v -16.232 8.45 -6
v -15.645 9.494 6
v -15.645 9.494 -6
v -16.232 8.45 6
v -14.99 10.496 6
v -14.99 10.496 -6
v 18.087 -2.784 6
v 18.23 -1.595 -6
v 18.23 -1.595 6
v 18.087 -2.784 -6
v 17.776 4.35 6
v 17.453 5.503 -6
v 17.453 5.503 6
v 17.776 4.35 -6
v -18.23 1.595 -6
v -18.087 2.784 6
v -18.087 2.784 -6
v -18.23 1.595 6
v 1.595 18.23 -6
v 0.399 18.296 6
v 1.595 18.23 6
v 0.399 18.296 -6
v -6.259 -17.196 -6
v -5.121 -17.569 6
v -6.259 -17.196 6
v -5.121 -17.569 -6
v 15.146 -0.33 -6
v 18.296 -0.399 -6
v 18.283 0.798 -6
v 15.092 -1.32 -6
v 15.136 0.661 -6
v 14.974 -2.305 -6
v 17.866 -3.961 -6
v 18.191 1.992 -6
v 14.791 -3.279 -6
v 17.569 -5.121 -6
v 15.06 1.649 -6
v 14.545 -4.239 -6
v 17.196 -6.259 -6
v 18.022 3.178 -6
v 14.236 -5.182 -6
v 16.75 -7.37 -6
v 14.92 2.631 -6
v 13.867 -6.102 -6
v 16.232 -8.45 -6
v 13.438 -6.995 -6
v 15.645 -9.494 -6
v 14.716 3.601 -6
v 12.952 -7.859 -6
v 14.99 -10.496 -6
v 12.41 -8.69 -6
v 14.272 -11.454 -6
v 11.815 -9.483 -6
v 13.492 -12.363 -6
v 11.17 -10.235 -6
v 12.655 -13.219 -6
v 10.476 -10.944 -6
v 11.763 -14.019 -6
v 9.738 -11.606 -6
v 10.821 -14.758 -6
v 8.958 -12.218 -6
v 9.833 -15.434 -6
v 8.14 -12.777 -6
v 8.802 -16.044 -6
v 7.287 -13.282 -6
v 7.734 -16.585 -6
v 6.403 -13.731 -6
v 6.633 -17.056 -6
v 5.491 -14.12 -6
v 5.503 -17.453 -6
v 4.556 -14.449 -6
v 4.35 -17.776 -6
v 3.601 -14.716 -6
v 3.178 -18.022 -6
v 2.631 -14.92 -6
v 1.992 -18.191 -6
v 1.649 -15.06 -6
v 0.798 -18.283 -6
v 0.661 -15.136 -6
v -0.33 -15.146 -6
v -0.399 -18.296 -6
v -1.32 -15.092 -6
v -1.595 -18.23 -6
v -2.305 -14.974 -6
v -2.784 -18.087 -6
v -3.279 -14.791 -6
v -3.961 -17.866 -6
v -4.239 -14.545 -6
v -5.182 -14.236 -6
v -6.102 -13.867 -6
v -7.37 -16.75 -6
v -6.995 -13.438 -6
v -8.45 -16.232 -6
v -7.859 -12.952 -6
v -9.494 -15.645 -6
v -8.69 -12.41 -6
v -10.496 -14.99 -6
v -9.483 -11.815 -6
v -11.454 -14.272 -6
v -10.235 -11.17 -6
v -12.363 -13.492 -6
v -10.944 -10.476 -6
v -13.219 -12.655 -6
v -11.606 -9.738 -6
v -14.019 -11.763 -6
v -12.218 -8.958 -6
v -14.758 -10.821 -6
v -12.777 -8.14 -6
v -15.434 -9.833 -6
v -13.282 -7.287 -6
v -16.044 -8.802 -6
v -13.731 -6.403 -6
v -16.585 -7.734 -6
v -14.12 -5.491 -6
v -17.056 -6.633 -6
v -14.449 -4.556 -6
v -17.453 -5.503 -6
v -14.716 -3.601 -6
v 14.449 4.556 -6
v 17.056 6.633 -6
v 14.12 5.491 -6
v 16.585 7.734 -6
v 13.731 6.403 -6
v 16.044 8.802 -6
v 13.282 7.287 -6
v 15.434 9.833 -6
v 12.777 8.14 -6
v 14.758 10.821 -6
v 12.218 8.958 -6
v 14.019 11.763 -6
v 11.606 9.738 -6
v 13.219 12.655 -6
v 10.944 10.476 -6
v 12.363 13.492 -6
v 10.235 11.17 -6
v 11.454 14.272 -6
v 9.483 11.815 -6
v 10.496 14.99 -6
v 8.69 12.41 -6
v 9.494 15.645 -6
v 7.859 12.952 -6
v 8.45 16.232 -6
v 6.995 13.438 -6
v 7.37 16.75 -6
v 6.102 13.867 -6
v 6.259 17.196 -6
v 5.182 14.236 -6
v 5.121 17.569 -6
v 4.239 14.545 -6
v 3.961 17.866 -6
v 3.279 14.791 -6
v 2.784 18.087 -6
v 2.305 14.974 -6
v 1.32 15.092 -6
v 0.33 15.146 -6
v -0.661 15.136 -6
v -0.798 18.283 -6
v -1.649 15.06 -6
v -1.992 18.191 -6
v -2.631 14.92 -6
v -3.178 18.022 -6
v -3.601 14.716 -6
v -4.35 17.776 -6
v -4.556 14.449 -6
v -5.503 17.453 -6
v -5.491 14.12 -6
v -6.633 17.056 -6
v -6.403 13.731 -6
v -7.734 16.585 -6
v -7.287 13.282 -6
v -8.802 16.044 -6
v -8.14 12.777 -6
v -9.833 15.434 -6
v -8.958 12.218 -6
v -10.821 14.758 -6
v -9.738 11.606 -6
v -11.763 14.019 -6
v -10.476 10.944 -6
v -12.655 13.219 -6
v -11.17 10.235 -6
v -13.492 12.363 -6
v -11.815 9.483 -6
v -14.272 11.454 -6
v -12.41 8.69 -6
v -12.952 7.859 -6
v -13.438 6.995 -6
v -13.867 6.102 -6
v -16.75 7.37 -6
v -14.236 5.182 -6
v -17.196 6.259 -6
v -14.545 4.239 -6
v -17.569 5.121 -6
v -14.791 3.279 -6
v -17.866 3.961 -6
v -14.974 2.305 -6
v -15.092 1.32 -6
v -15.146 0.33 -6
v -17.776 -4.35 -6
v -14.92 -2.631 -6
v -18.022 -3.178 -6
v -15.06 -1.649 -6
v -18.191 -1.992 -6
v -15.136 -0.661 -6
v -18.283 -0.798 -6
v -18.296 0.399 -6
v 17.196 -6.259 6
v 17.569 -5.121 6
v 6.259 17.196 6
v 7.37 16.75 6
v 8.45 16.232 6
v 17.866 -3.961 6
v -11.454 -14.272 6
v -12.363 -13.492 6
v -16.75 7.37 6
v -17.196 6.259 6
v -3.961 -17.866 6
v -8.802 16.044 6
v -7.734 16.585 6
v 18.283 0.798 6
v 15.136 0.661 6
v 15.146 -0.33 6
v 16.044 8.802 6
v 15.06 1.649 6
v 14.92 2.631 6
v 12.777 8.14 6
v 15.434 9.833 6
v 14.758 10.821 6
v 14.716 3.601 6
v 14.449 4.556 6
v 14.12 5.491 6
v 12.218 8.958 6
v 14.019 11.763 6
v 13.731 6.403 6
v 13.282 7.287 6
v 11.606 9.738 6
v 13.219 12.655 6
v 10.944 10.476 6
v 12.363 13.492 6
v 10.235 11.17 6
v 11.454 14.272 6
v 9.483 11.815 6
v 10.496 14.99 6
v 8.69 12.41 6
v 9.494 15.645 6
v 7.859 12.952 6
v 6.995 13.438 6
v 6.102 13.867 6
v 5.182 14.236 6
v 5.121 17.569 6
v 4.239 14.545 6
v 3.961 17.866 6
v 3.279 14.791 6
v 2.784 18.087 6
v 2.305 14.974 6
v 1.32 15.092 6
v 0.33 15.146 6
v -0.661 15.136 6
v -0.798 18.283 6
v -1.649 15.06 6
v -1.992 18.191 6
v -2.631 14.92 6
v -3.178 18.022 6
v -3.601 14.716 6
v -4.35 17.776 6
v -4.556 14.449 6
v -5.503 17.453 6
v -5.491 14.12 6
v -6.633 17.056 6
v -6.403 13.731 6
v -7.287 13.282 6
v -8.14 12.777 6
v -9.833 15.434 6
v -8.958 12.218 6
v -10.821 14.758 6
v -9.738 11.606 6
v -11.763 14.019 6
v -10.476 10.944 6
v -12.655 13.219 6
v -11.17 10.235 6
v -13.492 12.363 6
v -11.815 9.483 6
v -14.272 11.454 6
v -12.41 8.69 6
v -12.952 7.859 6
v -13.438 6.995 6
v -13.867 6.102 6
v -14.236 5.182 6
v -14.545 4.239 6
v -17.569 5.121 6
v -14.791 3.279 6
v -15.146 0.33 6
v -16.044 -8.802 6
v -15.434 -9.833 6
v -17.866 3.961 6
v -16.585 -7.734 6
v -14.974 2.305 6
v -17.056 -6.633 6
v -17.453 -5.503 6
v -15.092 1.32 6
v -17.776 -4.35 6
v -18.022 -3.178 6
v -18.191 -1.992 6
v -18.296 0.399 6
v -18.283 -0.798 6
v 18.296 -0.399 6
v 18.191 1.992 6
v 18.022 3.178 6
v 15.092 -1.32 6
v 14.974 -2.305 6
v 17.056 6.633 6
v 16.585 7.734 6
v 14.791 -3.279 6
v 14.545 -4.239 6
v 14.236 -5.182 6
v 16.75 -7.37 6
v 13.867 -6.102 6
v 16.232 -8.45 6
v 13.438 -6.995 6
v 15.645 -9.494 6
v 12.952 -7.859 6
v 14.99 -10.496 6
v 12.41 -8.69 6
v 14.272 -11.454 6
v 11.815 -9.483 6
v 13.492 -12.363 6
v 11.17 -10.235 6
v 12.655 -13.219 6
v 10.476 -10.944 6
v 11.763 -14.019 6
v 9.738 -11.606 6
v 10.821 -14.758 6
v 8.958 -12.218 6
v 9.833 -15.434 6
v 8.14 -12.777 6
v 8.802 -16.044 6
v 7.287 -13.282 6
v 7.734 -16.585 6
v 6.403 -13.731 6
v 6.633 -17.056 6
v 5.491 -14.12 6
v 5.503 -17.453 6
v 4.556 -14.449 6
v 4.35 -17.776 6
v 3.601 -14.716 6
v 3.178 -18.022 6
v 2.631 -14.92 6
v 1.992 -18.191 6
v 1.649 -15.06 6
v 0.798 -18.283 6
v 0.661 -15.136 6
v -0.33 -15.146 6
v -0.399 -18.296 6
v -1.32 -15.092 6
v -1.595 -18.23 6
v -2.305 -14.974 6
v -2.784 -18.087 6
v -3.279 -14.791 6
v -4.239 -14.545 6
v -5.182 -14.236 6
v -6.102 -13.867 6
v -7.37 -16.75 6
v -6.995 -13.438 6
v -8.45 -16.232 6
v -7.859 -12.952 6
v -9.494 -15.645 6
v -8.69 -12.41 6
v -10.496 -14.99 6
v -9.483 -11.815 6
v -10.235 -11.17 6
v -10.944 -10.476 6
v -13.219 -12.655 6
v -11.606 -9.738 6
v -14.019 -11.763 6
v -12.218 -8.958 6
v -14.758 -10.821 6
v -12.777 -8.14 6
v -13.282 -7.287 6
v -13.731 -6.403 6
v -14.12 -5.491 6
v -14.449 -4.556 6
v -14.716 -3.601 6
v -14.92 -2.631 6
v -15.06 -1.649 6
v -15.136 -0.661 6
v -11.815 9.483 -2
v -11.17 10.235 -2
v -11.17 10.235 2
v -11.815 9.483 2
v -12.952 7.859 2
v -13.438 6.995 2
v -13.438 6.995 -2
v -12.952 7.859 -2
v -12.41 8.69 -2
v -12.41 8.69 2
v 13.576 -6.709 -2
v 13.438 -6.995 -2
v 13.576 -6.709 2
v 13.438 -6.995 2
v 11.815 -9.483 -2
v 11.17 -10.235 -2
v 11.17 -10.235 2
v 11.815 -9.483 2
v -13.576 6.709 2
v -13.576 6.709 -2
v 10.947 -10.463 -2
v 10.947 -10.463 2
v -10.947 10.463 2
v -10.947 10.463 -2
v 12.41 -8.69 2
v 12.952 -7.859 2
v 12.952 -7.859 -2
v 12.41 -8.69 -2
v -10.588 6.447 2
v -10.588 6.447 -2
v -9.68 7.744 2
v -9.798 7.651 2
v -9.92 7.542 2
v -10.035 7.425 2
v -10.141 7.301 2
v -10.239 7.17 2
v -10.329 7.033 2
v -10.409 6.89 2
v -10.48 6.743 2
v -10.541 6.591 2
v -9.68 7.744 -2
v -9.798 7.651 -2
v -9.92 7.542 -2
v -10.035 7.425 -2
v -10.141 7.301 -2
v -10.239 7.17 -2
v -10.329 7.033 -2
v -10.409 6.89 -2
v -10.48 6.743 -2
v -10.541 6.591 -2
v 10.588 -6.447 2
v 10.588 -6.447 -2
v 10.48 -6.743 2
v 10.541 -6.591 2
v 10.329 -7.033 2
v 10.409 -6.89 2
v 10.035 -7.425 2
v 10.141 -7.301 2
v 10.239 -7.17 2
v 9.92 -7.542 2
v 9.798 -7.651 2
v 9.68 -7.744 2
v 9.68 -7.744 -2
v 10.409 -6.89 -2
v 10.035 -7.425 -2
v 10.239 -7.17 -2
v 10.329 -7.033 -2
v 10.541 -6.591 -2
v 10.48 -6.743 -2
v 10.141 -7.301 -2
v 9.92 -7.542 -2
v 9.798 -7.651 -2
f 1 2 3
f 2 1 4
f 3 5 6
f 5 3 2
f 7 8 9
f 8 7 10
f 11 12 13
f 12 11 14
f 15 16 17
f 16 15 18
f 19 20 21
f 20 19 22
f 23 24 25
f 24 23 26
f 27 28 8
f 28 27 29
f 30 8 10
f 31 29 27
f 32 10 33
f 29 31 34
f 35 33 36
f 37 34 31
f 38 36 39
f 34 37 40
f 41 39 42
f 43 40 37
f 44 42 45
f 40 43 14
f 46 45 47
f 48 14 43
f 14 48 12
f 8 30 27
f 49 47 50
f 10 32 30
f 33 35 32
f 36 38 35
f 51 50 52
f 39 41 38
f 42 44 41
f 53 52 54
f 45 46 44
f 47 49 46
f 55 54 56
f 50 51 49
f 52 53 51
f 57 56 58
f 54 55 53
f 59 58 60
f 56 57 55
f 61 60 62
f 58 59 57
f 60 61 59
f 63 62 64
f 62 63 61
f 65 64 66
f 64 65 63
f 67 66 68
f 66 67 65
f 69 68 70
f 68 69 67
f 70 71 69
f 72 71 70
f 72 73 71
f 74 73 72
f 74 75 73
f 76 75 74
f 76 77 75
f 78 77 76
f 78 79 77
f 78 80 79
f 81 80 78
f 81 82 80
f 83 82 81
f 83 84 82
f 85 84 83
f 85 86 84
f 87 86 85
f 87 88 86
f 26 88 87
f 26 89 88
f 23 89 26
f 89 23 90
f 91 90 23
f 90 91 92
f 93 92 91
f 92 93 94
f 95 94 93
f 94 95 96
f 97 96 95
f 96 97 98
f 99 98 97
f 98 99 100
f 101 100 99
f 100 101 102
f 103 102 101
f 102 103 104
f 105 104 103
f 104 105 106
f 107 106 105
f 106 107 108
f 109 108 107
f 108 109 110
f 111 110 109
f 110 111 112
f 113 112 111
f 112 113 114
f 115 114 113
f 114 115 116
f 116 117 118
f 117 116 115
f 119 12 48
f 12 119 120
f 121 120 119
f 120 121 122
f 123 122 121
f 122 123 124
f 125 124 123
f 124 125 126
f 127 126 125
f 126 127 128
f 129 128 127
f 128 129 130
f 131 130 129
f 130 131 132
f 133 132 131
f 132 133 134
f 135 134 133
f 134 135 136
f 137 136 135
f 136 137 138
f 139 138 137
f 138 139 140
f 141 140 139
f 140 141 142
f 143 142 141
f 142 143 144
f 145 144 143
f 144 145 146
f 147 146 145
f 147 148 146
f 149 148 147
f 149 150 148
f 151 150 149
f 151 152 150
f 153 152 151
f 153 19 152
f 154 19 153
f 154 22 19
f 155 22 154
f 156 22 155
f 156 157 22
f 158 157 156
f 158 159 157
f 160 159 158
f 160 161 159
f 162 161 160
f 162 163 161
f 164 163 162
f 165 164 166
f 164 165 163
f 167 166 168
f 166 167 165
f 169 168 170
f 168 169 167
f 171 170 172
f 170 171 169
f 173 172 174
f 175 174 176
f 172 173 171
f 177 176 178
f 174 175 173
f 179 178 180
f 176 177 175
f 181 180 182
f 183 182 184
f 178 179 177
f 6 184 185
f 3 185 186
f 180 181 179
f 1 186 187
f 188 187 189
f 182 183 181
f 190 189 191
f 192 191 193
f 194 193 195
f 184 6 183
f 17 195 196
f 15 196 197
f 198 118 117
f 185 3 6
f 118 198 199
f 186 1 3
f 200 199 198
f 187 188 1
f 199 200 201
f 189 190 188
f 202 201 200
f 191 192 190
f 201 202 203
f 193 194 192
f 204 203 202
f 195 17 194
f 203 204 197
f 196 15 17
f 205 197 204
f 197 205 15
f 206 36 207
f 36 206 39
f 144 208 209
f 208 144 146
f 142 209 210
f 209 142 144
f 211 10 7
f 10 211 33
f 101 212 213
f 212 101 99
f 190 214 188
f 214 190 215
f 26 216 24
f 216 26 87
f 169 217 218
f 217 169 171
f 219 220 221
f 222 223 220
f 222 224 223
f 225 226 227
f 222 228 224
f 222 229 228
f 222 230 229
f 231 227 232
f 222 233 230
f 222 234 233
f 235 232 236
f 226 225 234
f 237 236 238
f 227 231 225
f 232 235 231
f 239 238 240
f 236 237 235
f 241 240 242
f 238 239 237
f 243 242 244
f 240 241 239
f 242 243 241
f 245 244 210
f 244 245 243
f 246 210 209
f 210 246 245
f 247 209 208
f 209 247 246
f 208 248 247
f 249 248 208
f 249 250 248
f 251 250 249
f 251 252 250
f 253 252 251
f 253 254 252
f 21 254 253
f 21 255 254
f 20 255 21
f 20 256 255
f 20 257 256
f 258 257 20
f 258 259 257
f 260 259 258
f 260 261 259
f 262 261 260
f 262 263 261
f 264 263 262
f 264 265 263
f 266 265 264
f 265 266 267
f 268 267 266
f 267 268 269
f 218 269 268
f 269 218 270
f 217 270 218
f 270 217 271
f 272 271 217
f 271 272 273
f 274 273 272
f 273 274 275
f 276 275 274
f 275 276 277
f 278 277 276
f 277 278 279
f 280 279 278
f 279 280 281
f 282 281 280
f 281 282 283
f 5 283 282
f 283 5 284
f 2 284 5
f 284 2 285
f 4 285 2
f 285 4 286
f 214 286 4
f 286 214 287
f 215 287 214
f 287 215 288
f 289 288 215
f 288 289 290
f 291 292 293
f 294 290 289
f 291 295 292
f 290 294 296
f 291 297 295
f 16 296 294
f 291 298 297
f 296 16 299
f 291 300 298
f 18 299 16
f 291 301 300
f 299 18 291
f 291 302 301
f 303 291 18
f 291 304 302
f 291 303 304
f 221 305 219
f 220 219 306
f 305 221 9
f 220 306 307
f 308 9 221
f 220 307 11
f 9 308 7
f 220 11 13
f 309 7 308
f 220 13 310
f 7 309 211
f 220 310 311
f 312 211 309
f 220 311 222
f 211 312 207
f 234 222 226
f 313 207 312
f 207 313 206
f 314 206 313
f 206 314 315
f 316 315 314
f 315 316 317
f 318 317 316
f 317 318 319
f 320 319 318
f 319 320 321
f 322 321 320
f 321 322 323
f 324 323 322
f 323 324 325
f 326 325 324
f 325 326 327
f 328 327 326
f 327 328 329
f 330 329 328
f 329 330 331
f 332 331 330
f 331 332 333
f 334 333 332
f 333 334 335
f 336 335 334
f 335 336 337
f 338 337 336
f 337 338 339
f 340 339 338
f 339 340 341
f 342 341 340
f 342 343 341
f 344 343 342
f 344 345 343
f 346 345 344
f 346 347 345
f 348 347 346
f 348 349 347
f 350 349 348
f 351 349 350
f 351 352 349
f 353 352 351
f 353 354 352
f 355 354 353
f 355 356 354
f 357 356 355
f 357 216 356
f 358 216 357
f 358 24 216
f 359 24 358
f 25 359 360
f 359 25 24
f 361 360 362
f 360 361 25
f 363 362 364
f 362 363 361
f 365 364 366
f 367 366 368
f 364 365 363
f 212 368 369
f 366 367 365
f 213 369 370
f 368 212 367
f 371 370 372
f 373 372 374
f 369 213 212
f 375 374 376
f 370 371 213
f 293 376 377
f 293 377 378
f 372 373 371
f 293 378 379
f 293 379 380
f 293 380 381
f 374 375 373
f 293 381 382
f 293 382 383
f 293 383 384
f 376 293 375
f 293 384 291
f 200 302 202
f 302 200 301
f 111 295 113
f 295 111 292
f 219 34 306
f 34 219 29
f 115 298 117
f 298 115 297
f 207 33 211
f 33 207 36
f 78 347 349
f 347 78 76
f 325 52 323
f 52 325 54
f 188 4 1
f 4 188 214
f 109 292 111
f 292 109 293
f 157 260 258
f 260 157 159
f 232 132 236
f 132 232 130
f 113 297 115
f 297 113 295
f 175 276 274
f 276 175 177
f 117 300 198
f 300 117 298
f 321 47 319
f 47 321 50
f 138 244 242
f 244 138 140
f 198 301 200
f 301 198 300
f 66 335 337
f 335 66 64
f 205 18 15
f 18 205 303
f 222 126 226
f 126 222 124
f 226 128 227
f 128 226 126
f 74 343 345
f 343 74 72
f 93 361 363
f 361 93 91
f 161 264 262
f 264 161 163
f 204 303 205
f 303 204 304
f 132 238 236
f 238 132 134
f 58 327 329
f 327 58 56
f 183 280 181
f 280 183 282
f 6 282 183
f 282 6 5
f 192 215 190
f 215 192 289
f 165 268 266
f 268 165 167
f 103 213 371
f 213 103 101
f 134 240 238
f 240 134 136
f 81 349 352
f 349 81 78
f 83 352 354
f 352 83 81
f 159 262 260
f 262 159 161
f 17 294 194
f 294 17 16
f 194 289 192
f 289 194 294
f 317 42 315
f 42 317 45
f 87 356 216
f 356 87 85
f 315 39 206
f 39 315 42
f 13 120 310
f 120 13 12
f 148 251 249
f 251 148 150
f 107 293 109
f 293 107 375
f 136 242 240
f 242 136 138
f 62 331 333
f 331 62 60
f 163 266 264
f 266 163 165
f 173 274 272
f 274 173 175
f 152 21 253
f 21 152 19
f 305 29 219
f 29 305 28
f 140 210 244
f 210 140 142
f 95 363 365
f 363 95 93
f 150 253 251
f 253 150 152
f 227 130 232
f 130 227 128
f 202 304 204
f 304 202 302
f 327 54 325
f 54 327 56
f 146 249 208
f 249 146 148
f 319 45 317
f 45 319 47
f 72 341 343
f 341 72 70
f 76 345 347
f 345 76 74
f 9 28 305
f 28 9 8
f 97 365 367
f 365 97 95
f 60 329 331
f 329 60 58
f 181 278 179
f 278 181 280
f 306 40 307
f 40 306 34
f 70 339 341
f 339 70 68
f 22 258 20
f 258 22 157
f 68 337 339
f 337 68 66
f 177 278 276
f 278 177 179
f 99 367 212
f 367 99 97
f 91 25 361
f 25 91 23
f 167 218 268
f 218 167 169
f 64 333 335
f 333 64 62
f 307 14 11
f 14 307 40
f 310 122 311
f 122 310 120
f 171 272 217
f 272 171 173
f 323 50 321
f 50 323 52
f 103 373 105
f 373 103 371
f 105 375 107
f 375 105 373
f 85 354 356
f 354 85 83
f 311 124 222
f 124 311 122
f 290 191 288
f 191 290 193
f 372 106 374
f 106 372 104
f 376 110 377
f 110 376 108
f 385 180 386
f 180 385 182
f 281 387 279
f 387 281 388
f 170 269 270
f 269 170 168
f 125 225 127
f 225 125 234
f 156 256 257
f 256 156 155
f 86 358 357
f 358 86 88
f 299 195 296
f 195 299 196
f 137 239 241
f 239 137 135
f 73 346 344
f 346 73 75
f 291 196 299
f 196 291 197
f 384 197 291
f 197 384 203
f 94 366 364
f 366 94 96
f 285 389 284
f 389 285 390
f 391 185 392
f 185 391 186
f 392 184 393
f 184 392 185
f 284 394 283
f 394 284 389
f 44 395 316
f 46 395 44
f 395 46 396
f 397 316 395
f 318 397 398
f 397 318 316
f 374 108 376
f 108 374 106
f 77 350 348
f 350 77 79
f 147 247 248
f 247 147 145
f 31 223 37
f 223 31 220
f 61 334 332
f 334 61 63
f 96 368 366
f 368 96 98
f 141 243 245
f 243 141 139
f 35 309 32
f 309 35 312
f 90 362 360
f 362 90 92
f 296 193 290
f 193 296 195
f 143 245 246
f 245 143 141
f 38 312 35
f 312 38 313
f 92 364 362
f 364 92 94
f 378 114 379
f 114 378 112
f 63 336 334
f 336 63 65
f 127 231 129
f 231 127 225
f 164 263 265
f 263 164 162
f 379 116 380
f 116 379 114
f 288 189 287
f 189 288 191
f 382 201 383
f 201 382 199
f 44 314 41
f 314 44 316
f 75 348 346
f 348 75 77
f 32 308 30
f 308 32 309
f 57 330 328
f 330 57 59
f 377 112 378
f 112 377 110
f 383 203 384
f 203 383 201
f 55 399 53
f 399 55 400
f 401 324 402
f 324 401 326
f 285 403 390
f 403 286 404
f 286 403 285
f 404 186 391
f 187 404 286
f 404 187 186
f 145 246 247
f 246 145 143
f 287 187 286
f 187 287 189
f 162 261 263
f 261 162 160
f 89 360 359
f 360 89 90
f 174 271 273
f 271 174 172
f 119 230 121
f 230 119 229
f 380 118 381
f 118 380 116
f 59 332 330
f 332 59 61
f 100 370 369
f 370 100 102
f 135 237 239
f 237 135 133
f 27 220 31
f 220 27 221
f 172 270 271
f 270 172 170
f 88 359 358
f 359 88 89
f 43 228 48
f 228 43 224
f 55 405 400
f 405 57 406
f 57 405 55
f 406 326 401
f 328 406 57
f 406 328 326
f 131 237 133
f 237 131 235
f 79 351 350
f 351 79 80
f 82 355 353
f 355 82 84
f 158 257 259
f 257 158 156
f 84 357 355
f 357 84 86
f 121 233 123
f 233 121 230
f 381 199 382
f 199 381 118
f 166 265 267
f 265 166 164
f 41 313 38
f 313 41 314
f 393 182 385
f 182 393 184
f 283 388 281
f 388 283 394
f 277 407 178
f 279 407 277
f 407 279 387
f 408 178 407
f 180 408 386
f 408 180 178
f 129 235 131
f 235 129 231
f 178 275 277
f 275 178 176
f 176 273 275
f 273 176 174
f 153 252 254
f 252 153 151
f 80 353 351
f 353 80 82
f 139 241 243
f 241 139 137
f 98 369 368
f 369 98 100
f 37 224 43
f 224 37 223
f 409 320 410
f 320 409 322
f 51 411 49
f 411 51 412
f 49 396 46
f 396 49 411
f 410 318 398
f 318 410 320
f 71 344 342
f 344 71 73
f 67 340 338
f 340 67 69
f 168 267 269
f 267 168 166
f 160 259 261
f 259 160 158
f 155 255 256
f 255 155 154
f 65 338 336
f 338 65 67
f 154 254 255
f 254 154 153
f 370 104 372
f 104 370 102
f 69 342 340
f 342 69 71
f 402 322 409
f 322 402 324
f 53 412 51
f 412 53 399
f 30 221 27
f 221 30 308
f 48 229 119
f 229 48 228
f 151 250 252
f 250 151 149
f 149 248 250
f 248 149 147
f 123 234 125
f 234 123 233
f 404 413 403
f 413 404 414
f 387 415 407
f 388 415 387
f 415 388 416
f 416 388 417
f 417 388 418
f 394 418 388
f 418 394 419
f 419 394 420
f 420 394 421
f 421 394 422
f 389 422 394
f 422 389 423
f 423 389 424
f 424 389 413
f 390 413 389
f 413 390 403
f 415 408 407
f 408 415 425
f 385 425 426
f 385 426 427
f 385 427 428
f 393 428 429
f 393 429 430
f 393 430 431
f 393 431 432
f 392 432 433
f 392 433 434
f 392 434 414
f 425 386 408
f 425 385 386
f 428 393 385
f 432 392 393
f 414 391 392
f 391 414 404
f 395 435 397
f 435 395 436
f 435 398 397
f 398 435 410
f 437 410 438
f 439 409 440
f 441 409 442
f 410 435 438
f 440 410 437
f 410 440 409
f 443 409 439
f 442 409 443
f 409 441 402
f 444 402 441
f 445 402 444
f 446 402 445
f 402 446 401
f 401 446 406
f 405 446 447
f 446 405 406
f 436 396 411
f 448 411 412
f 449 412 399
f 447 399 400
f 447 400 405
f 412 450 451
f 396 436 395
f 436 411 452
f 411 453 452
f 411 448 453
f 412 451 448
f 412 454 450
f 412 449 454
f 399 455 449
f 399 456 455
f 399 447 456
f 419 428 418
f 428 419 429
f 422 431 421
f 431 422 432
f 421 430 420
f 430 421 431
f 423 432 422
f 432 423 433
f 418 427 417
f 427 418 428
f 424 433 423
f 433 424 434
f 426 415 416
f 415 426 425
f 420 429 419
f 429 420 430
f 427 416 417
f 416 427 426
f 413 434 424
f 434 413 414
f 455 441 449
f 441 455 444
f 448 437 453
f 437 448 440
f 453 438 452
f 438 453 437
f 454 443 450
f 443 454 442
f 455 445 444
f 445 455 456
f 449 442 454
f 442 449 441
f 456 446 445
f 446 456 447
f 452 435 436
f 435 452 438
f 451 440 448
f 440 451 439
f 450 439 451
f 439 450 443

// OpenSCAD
//arm_length=181.2;
//bar_depth=27;
//base_width=110;
//base_depth=27;
//base_height=32.8;
//base_x=0;
//base_y=0;
//base_z=0;
//mount_hole_short_depth=14;
//mount_hole_long_depth=17;
arm_x=0;
arm_y=10;
arm_z=35.8;
//spool_mount_x=arm_x+9.3;    // =18.3
//spool_mount_y=arm_y+20;     // =10
//spool_mount_z=arm_z+165.3;  // =205.3

$fn = 96;

module twistlock_ring() {
  difference() {
    union() {
      cylinder(h = 12, r = 18.3, center = true );
    }  
// The center hole
    cylinder(h = 12, r = 15.15, center = true);              
 }
 
// add spool stops
  difference() {
    union() {
        translate([ 14, 0, -2]) 
        rotate([ 0, 0, 60 ])
          cylinder( h = 4, r = 3, center = false, $fn = 3 );
        
        mirror([ 1, 0, 0 ])
        translate([ 14, 0, -2])
        rotate([ 0, 0, 60 ])
          cylinder( h = 4, r = 3, center = false, $fn = 3 );     
    }
    translate([ 10, 0, 1]) 
      cylinder(h = 10, r = 2.5, center = true );
    
    mirror([ 1, 0, 0 ])
    translate([ 10, 0, 1]) 
      cylinder(h = 10, r = 2.5, center = true );
  }
}


// Twist Lock Cylinder

//*
//$fn = 100; // Number of facets for a smooth cylinder

module twistlock() {
arch_base   = 4;
arch_angle  = 160;
arch_radius = 15.5;

difference() {
    union() {
        cylinder(h = 13, d = 30, center = true);
    }
    //center hole
    translate([0, 0, 0]) 
      cylinder(13.2, r = 6, center = true);
    
    //channel guides
    rotate( [0, 0, 0])
    rotate_extrude( angle = arch_angle, $fn = 100 )
    translate( [-arch_radius, 0] )
    difference()
    translate( [0, -arch_base / 2] )
      square( arch_base );
    
    rotate( [180, 180, 0])
    rotate_extrude( angle = arch_angle, $fn = 100 )
    translate( [-arch_radius, 0] )
    difference()
    translate( [0, -arch_base / 2] )
      square( arch_base );
        
    //Add entrance notches
    rotate( [180, 180, -40])
    rotate_extrude( angle = 20, $fn = 100 )
    translate( [-arch_radius, 0] )
    difference()
    translate( [0, -arch_base / 2.2] )
      square( [4, 9] );
    
    rotate( [180, 180, -40])
    rotate_extrude( angle = 20, $fn = 100 )
    translate( [-arch_radius, 00] )
    difference()
    translate( [0 + 27, -arch_base / 2.2] )
      square( [4, 9] );

}    

    

//Add a bump
    union()
        translate ([11.5, 3, 0]) 
        cylinder( h = 4, r = 1, center =true);
        mirror([ 1, 0, 0 ])
        translate ([11.5, -3, 0]) 
        cylinder( h = 4, r = 1, center =true);
}

module test_base() {
  cube([ 35, 35, 2.5 ], center = true );
}

//*/
rotate([ 0, 0, 145 ])
//translate([ 20, 20, 20 ])
twistlock_ring();
//twistlock();
//translate([ 0, 0, -7.7 ])
//rotate ([ 0, 0, 40 ])
//test_base();
